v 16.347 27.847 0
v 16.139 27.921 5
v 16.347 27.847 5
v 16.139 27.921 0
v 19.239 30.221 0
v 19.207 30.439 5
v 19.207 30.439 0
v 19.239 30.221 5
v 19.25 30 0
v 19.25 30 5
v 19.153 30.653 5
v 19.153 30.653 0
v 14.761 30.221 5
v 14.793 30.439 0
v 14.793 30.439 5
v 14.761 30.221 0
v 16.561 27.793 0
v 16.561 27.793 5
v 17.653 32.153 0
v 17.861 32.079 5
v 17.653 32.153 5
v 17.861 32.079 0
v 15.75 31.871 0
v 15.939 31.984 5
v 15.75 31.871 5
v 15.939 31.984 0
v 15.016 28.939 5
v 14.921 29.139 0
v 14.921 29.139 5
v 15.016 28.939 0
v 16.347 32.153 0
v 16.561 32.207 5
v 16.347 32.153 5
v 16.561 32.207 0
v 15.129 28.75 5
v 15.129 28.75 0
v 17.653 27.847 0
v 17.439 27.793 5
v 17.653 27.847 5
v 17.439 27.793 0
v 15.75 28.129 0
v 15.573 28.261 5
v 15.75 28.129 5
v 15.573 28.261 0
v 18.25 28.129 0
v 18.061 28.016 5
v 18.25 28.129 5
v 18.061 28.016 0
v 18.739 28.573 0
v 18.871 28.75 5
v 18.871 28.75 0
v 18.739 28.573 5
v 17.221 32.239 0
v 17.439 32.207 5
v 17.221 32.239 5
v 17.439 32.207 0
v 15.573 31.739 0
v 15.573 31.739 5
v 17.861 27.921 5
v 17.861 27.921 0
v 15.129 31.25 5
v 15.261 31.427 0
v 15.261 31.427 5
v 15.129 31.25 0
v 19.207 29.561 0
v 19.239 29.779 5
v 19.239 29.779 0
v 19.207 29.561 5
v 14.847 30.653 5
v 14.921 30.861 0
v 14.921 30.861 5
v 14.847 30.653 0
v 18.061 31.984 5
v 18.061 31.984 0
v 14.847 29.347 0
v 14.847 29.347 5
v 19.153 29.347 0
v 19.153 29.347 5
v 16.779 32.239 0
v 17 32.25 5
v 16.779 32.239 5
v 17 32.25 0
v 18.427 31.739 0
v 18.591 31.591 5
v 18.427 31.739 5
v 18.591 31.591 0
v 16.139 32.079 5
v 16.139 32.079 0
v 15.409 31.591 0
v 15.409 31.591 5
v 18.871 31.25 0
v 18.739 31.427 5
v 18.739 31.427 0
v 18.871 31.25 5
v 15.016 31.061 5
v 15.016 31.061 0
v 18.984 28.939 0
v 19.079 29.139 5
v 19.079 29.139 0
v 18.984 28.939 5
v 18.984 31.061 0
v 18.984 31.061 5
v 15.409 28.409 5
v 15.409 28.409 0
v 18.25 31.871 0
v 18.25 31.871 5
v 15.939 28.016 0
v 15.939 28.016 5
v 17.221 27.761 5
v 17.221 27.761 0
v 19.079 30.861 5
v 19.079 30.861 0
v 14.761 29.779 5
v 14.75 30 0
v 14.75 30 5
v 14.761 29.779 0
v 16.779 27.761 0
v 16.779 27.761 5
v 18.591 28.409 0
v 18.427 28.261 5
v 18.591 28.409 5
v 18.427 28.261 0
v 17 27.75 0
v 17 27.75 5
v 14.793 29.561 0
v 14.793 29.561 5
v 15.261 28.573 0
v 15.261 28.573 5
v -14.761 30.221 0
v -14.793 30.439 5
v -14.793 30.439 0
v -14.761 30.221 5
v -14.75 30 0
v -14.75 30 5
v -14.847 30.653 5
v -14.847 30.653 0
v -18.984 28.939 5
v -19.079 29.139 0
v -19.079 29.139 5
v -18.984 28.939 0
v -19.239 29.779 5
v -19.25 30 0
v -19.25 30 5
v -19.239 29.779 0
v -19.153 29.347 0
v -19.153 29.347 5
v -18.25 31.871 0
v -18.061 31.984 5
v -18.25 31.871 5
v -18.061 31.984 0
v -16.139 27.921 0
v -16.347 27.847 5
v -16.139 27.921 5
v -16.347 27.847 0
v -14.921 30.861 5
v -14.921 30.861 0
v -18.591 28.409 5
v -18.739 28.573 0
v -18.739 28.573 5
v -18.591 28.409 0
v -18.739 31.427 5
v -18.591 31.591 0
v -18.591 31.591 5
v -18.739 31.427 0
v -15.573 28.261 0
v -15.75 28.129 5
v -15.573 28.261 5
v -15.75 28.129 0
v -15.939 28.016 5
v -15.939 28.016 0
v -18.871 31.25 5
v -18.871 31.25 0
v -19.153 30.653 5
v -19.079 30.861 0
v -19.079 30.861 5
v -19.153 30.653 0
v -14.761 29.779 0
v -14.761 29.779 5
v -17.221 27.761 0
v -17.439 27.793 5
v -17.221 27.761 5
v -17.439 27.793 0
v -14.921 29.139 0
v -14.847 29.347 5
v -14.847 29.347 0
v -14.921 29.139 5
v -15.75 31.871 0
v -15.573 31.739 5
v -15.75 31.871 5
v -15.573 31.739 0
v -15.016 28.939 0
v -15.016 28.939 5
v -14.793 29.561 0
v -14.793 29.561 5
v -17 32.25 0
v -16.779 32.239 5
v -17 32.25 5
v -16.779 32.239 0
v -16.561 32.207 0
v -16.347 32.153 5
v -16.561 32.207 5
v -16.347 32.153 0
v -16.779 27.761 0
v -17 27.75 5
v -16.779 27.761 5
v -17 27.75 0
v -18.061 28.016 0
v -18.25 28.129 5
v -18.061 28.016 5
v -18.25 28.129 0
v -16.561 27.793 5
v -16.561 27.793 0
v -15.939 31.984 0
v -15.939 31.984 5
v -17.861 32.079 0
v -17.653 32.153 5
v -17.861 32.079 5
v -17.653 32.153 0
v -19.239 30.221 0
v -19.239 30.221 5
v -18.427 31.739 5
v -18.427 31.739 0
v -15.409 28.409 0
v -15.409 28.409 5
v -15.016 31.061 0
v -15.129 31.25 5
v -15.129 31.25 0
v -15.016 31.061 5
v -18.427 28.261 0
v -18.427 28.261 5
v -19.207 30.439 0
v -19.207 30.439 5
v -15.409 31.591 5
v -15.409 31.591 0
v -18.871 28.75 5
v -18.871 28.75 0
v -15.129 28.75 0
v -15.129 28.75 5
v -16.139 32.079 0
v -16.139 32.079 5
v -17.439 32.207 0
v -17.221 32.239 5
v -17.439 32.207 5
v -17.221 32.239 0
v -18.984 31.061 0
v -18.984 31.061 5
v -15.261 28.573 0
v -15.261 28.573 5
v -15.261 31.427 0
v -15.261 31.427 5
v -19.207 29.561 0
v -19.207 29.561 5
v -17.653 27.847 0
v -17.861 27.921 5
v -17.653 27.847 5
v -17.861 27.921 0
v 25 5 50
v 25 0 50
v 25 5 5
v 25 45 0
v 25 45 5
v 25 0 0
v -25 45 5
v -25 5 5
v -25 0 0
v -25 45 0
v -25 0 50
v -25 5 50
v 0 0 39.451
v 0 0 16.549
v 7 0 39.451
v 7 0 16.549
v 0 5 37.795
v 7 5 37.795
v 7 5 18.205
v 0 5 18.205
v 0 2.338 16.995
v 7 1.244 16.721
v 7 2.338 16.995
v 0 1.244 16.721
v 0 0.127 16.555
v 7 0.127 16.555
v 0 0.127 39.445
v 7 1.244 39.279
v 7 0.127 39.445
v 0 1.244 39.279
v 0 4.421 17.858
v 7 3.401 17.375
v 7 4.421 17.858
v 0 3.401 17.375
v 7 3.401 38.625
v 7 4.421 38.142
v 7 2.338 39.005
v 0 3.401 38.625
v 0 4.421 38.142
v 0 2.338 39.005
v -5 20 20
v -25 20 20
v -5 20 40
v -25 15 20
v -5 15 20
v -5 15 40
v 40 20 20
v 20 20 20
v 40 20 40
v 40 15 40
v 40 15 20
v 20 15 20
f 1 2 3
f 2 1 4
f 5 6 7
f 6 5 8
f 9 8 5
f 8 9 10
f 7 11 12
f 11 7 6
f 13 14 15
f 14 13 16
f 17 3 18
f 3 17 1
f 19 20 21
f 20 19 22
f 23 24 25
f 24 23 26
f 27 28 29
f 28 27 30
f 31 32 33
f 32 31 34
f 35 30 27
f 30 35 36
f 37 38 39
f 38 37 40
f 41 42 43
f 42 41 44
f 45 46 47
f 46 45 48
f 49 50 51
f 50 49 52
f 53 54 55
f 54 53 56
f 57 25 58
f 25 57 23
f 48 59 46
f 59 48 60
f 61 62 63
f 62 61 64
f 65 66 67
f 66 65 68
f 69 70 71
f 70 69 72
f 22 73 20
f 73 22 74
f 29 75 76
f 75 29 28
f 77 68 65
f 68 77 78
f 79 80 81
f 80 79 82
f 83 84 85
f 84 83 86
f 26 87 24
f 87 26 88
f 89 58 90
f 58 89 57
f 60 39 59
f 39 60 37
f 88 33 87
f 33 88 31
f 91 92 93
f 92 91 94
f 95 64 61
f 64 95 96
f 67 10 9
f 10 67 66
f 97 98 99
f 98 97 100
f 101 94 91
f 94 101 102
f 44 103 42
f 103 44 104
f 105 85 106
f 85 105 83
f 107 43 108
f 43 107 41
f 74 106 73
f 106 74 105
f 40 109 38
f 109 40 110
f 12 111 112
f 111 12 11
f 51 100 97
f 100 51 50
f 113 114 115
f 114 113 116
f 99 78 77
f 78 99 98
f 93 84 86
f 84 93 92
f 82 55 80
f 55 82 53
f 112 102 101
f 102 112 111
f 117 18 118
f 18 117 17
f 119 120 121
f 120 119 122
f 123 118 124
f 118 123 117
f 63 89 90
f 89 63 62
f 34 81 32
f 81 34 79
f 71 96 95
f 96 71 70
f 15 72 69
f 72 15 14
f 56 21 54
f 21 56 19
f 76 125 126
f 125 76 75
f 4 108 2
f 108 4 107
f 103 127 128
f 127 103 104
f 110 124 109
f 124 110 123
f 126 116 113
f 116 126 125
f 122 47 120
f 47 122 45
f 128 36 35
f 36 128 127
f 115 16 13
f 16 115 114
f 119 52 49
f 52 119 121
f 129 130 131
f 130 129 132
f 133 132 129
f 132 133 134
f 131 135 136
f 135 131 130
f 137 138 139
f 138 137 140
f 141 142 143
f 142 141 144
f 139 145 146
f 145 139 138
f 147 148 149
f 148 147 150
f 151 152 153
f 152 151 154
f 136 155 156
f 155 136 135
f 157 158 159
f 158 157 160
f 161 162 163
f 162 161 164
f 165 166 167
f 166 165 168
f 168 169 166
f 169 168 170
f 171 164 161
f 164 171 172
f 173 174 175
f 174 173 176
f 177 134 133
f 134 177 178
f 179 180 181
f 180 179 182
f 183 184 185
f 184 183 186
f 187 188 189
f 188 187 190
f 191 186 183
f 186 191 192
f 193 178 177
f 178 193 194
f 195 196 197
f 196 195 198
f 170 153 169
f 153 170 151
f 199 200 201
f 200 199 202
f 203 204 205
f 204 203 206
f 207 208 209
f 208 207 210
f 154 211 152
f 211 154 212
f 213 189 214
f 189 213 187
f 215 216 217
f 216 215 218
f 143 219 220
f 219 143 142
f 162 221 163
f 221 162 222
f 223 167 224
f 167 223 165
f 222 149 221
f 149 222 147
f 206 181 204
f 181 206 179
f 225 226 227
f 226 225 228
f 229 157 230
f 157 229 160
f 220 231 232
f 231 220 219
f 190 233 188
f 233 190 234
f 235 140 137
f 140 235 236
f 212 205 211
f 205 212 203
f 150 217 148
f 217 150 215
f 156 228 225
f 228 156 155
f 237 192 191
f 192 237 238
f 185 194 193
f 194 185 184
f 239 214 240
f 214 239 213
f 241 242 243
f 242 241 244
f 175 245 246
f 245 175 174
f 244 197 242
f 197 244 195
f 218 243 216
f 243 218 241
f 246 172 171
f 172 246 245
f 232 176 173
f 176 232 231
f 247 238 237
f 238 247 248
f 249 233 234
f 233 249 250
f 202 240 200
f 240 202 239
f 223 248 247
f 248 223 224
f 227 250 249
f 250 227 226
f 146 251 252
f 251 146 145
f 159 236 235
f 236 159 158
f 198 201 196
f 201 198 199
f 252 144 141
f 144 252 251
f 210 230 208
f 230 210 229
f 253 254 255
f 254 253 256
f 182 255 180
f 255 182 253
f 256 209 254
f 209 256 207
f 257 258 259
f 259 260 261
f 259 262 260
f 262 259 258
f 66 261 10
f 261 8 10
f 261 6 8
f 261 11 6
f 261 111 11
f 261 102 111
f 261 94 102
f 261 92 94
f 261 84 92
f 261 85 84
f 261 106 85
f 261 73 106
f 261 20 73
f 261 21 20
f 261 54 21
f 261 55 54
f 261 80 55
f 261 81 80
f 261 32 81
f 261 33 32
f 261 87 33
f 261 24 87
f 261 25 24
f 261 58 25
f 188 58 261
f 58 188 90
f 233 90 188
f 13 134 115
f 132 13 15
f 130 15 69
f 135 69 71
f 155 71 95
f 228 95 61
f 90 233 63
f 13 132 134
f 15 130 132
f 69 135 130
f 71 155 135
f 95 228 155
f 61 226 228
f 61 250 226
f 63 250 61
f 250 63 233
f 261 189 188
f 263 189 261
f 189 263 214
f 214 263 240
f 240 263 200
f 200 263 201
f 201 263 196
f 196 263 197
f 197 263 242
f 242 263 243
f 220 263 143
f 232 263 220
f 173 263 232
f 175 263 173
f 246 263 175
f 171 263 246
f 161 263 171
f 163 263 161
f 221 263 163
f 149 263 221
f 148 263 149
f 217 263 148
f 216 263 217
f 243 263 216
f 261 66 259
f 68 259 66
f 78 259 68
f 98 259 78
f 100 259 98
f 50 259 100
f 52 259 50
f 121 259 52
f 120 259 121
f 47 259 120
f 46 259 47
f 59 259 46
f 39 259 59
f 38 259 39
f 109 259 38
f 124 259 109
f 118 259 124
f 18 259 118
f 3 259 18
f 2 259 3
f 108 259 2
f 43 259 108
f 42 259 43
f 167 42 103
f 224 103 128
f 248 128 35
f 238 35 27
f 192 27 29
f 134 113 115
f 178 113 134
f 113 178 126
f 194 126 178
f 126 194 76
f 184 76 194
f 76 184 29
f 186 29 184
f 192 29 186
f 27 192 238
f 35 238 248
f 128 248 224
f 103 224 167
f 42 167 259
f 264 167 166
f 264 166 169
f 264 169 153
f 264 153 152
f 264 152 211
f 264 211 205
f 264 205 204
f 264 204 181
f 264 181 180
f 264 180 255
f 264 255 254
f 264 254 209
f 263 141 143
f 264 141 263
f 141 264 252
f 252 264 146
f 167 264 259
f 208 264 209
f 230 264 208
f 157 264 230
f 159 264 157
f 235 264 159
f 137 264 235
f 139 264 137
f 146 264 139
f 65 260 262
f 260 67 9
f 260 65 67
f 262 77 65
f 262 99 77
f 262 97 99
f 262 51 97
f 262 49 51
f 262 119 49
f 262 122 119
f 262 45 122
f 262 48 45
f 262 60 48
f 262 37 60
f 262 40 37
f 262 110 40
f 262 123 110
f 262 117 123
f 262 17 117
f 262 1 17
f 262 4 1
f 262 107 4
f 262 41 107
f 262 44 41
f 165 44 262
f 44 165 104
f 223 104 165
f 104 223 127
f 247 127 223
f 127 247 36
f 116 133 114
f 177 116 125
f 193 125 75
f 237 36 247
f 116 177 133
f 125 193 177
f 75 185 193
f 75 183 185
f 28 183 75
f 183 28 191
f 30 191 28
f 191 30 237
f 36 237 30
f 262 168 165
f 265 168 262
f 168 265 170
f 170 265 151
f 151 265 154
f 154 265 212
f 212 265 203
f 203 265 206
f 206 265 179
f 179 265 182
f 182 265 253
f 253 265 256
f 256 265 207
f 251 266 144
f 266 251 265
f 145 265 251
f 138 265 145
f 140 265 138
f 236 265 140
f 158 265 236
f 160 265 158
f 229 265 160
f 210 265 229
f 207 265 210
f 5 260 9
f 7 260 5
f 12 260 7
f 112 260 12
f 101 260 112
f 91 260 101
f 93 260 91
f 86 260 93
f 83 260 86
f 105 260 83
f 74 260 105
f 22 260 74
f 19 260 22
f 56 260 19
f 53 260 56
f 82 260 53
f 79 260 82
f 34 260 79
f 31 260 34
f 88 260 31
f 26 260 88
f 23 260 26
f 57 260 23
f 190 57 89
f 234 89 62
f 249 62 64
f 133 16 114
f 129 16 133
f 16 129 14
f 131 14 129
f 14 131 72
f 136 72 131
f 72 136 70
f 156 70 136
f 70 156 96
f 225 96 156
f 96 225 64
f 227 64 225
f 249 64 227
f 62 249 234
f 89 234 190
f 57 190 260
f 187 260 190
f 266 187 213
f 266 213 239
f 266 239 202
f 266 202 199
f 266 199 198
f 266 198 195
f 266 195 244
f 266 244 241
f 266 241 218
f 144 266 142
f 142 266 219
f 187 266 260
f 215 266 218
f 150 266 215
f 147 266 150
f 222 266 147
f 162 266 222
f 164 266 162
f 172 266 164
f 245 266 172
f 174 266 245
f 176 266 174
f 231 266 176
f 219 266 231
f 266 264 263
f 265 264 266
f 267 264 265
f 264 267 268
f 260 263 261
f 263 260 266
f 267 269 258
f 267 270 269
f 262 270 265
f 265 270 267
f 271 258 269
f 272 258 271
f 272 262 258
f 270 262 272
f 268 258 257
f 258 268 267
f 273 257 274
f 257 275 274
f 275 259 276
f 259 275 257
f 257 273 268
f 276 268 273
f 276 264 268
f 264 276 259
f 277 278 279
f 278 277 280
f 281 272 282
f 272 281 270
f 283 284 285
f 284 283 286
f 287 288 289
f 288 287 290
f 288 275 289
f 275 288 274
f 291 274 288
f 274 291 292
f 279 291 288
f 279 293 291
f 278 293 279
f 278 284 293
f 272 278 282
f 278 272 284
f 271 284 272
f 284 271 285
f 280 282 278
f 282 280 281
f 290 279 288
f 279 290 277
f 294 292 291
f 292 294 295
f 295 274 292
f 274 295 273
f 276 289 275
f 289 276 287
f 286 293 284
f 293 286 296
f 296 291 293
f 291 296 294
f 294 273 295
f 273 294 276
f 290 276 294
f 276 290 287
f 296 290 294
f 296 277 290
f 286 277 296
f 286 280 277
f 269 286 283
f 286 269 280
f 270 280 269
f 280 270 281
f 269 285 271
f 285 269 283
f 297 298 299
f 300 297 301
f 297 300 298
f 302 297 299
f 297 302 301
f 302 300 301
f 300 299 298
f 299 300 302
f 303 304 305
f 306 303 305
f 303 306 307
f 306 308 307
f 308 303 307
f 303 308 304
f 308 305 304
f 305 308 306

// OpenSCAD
// L-shaped mounting bracket for NEMA 17 stepper motor
// Print orientation: base plate on bed (z = 0), vertical plate builds upward (+Z)

// ---------------- Parameters ----------------
$fn = 64;

// Base plate
base_x0 = -25;      // base plate X start
base_x1 = 25;       // base plate X end
base_y0 = 0;        // base plate Y start
base_y1 = 45;       // base plate Y end
base_z0 = 0;        // base plate Z start
base_z1 = 5;        // base plate Z end
hole_m4_x = -17;    // M4 through-hole X position (left)
hole_m4_y = 30;     // M4 through-hole Y position
hole_m4_r = 2.25;   // M4 hole radius

// Vertical motor plate
motor_x0 = -25;     // motor plate X start
motor_x1 = 25;      // motor plate X end
motor_y0 = 0;       // motor plate Y start
motor_y1 = 5;       // motor plate Y end (sits on back edge of base)
motor_z0 = 0;       // motor plate Z start
motor_z1 = 50;      // motor plate Z end

// Boss hole (motor centring boss)
boss_r = 11.5;      // boss hole radius (23 mm diameter)
boss_x = 0;         // boss hole X centre
boss_z = 28;        // boss hole Z centre

// Screw holes for boss
screw_r = 1.7;      // M3 screw hole radius (3.4 mm diameter)
screw_n = 4;        // number of screw holes
screw_p = 31;       // square pattern side length
screw_a = 90;       // screw hole rotation angle (degrees)

// Gussets
gusset_t = 5;       // gusset thickness (along X)
gusset_w = 20;      // gusset leg length along +Y
gusset_h = 20;      // gusset leg length along +Z
gusset_x0 = -25;    // left gusset X start
gusset_x1 = -20;    // left gusset X end
// right gusset runs from x = 20 to x = 25

// ---------------- Model ----------------
union() {
    // Base plate with M4 through-holes
    difference() {
        translate([base_x0, base_y0, base_z0])
            cube([base_x1 - base_x0, base_y1 - base_y0, base_z1 - base_z0]);
        for (sx = [-1, 1])
            translate([sx * hole_m4_x, hole_m4_y, -1])
                cylinder(r = hole_m4_r, h = base_z1 + 2);
    }

    // Vertical motor plate with boss hole and screw holes
    difference() {
        translate([motor_x0, motor_y0, motor_z0])
            cube([motor_x1 - motor_x0, motor_y1 - motor_y0, motor_z1 - motor_z0]);
        // Boss hole along Y, extending past top and bottom faces
        translate([boss_x, -1, boss_z])
            rotate([0, 90, 0])
                cylinder(r = boss_r, h = motor_y1 - motor_y0 + 2);
        // Screw holes on square pattern, centred on boss hole
        for (i = [0 : screw_n - 1]) {
            a = screw_a * i / (screw_n - 1);
            translate([boss_x + (screw_p / 2) * cos(a),
                       boss_z + (screw_p / 2) * sin(a),
                       -1])
                cylinder(r = screw_r, h = motor_z1 + 2);
        }
    }

    // Triangular gussets, flush with left and right edges
    for (gx = [gusset_x0, 20]) {
        translate([gx, gusset_w, gusset_h])
            rotate([90, 0, 0])
                linear_extrude(height = gusset_t)
                    polygon(points = [
                        [0, 0],
                        [gusset_w, 0],
                        [gusset_w, gusset_h]
                    ]);
    }
}
